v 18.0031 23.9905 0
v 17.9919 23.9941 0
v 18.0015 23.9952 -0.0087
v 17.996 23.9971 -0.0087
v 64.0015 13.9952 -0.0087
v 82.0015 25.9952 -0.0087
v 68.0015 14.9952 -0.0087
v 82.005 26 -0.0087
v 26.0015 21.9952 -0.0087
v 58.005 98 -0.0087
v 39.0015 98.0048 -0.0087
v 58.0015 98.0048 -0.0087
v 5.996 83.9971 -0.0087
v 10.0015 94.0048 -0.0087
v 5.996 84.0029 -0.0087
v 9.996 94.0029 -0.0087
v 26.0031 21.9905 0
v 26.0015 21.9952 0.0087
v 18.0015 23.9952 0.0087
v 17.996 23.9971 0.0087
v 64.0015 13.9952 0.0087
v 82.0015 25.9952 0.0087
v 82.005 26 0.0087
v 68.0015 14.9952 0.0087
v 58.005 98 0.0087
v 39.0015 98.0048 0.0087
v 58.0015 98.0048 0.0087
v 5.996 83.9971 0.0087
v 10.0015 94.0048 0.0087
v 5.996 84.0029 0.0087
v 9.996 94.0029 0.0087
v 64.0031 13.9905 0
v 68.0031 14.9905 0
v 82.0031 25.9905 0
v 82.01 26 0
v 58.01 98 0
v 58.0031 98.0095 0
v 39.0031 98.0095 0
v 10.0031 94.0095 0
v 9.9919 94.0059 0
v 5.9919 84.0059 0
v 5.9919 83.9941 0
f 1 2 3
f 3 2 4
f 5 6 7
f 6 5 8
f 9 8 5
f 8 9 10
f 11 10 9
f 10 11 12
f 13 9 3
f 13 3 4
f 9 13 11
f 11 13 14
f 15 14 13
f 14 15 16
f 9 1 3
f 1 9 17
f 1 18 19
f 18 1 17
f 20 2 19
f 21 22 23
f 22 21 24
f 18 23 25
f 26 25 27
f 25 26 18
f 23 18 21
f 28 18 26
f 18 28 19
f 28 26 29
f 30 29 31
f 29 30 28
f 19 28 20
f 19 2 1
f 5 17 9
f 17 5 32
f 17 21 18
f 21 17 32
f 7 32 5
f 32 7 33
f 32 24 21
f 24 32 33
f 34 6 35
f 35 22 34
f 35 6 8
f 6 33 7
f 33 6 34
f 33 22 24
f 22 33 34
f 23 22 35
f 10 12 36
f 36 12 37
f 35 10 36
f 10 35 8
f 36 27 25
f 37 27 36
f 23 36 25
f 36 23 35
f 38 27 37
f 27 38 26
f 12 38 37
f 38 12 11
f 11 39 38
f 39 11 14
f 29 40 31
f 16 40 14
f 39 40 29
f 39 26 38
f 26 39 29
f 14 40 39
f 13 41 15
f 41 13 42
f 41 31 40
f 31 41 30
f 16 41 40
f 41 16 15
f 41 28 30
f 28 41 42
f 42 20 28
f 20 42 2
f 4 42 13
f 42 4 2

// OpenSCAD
color([0.3519350680925015,0.6477014615427978,0.14125726454845833]) hull(){
    translate([18,24]) sphere(0.01);
    translate([26,22]) sphere(0.01);
    translate([44,47]) sphere(0.01);
}
color([0.23013900541024712,0.8285218163248013,0.9603761550286747]) hull(){
    translate([26,22]) sphere(0.01);
    translate([42,29]) sphere(0.01);
    translate([44,47]) sphere(0.01);
}
color([0.6050710034948523,0.017553655236826726,0.43262871278032167]) hull(){
    translate([18,24]) sphere(0.01);
    translate([44,47]) sphere(0.01);
    translate([18,58]) sphere(0.01);
}
color([0.2571490251669072,0.4480229944680496,0.14517873337393172]) hull(){
    translate([44,47]) sphere(0.01);
    translate([42,29]) sphere(0.01);
    translate([58,33]) sphere(0.01);
}
color([0.8405131005933094,0.9776834869331054,0.10300019528175153]) hull(){
    translate([42,29]) sphere(0.01);
    translate([58,33]) sphere(0.01);
    translate([64,14]) sphere(0.01);
}
color([0.998153073210626,0.8535026464000083,0.6855970549077809]) hull(){
    translate([26,22]) sphere(0.01);
    translate([42,29]) sphere(0.01);
    translate([64,14]) sphere(0.01);
}
color([0.7995005100691247,0.34047238184459006,0.1286635278612125]) hull(){
    translate([64,14]) sphere(0.01);
    translate([68,15]) sphere(0.01);
    translate([58,33]) sphere(0.01);
}
color([0.6020598448119898,0.9167847797194366,0.02081986636819022]) hull(){
    translate([68,15]) sphere(0.01);
    translate([82,26]) sphere(0.01);
    translate([58,33]) sphere(0.01);
}
color([0.9135118305629362,0.3823609034395232,0.42581309278619206]) hull(){
    translate([44,47]) sphere(0.01);
    translate([44,55]) sphere(0.01);
    translate([58,33]) sphere(0.01);
}
color([0.08967296065919184,0.0016857337534631478,0.31287848776698257]) hull(){
    translate([44,55]) sphere(0.01);
    translate([58,33]) sphere(0.01);
    translate([82,26]) sphere(0.01);
}
color([0.09731792302828757,0.364404074066101,0.8754307508322564]) hull(){
    translate([44,55]) sphere(0.01);
    translate([82,26]) sphere(0.01);
    translate([58,98]) sphere(0.01);
}
color([0.6967090939923642,0.5776053806129825,0.18685318159950626]) hull(){
    translate([44,55]) sphere(0.01);
    translate([58,98]) sphere(0.01);
    translate([50,93]) sphere(0.01);
}
color([0.9585806736472646,0.593334846568766,0.09927504601217696]) hull(){
    translate([50,93]) sphere(0.01);
    translate([58,98]) sphere(0.01);
    translate([39,98]) sphere(0.01);
}
color([0.19313665173925,0.6863688301261038,0.2093263356404984]) hull(){
    translate([44,47]) sphere(0.01);
    translate([44,55]) sphere(0.01);
    translate([18,58]) sphere(0.01);
}
color([0.2694340379225941,0.24598969558588324,0.16092298384524362]) hull(){
    translate([44,55]) sphere(0.01);
    translate([50,93]) sphere(0.01);
    translate([22,90]) sphere(0.01);
}
color([0.5102606956149307,0.431705445139412,0.38909399282504675]) hull(){
    translate([50,93]) sphere(0.01);
    translate([39,98]) sphere(0.01);
    translate([22,90]) sphere(0.01);
}
color([0.3194819673674283,0.6655357355223767,0.22692357675811492]) hull(){
    translate([39,98]) sphere(0.01);
    translate([22,90]) sphere(0.01);
    translate([10,94]) sphere(0.01);
}
color([0.9464906820257937,0.35776616524050997,0.9421064453260054]) hull(){
    translate([22,90]) sphere(0.01);
    translate([10,94]) sphere(0.01);
    translate([6,84]) sphere(0.01);
}
color([0.3792404853118415,0.27508202782836655,0.9368074710650367]) hull(){
    translate([44,55]) sphere(0.01);
    translate([22,90]) sphere(0.01);
    translate([18,58]) sphere(0.01);
}
color([0.7670397757471089,0.17483880300164423,0.7474114244696689]) hull(){
    translate([18,58]) sphere(0.01);
    translate([22,90]) sphere(0.01);
    translate([6,84]) sphere(0.01);
}
color([0.6015236368594579,0.5872808850844162,0.28390336255679416]) hull(){
    translate([18,58]) sphere(0.01);
    translate([6,84]) sphere(0.01);
    translate([18,24]) sphere(0.01);
}
